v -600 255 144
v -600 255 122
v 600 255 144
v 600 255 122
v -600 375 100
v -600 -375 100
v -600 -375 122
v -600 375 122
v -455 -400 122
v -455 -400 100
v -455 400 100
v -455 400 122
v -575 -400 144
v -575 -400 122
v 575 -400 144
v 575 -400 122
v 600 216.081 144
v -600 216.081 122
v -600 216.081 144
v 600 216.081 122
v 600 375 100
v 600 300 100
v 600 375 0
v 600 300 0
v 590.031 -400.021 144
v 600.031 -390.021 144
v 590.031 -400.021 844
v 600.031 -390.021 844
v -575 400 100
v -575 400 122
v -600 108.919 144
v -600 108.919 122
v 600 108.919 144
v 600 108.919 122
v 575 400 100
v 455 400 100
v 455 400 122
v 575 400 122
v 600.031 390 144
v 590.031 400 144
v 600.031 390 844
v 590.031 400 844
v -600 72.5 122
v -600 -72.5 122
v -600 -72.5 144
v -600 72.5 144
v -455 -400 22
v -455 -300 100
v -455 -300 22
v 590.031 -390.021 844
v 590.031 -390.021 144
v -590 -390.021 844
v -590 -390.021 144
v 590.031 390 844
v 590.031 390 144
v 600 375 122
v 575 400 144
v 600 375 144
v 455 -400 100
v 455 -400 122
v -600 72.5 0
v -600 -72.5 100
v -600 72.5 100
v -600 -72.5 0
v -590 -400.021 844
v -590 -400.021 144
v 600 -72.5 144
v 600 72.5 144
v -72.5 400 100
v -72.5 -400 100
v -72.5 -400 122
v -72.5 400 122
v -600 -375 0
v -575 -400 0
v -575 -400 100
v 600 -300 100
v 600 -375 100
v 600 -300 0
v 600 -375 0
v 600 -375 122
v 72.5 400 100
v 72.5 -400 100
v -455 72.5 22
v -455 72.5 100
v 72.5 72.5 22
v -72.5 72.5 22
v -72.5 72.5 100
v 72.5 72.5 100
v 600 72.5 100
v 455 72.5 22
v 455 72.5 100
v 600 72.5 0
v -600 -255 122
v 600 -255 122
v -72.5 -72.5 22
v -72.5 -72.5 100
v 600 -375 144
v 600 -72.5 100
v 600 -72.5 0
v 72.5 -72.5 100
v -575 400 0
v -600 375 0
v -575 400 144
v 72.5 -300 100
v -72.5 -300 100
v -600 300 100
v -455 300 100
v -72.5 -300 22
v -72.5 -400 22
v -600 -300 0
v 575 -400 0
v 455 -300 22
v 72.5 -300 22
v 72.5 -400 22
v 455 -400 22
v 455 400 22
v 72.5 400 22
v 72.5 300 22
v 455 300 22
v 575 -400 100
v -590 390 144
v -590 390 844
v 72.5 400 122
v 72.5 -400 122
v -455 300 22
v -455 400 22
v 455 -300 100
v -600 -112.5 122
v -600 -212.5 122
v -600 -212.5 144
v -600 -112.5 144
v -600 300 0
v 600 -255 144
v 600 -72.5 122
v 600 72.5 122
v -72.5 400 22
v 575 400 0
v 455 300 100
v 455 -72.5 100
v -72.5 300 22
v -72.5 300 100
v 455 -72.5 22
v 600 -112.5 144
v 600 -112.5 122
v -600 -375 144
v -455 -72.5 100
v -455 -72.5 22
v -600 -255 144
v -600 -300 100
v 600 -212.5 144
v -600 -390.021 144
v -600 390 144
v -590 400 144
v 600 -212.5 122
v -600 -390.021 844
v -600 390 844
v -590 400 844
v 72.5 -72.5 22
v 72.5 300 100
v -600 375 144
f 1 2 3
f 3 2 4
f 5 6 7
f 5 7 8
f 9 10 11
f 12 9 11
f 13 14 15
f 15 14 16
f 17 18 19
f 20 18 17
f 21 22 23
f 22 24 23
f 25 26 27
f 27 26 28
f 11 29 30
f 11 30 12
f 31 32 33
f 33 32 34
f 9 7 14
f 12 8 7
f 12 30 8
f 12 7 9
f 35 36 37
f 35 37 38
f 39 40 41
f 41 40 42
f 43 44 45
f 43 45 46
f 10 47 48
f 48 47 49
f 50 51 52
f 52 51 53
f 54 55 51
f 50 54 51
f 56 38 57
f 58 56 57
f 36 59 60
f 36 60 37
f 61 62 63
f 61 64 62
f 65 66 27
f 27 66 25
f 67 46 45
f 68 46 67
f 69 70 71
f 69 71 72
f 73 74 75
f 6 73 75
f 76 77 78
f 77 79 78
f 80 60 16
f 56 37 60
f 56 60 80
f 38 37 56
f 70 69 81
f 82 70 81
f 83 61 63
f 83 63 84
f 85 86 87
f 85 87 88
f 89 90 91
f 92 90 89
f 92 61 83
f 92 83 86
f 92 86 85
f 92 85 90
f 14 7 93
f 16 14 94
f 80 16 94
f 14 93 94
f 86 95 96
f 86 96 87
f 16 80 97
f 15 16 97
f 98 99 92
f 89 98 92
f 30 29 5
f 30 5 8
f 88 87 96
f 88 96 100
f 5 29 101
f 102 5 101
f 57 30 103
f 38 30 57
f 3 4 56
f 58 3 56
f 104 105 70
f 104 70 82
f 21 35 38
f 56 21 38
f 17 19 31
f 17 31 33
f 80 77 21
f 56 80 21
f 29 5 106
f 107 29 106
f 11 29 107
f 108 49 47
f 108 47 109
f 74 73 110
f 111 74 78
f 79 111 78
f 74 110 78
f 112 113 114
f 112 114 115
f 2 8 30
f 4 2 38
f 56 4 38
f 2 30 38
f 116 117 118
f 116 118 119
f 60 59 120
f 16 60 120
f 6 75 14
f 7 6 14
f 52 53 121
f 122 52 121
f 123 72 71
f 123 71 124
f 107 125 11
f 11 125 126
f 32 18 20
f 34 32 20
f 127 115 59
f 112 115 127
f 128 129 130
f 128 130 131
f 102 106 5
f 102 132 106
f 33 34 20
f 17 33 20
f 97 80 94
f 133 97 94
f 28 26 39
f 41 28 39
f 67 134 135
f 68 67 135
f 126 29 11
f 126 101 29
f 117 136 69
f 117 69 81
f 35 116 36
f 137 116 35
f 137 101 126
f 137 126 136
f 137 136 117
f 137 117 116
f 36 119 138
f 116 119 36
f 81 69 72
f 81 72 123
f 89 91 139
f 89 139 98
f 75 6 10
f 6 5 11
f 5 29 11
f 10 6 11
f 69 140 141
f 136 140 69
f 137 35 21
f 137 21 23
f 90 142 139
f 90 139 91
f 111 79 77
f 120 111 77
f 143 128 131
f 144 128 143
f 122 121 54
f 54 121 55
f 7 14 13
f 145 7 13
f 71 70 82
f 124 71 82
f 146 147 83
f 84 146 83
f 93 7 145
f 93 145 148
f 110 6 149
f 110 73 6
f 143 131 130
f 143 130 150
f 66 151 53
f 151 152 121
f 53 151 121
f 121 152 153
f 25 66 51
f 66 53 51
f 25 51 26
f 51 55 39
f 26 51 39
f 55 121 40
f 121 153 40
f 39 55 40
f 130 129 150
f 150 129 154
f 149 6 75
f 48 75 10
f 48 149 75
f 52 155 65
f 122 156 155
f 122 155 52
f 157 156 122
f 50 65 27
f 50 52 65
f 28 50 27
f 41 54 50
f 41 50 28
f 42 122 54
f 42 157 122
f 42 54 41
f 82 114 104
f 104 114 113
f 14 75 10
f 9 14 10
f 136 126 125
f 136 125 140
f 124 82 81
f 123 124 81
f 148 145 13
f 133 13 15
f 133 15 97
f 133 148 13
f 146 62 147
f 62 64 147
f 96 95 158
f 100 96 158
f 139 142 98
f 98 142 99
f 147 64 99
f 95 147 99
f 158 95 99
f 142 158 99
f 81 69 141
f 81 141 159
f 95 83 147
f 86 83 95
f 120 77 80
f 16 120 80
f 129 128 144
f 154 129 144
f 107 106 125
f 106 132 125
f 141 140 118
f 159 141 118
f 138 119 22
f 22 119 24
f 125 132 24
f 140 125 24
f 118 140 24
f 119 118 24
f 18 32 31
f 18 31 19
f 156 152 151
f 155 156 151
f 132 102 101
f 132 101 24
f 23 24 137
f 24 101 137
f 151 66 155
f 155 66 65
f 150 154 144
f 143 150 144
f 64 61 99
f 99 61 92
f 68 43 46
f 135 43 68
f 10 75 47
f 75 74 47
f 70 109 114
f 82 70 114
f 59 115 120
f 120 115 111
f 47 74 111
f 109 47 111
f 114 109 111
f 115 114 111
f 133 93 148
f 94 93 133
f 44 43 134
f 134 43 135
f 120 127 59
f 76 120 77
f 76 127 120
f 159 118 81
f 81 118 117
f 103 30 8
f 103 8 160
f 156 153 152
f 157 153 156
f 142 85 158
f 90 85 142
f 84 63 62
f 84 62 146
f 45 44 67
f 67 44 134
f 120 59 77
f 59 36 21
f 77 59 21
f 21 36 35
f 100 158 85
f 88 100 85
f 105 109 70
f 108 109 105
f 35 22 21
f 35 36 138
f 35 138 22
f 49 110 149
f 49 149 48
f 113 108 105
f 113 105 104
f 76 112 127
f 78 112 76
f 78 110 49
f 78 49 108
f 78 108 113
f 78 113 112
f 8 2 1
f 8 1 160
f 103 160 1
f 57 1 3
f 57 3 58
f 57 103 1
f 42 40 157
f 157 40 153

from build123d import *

# Parameters (mm, degrees)
F0_W       = 1200
F0_H       = 100
F1_DEPTH   = 22
F0_H_2     = 72.5
F2_W       = 145
F2_H       = 100
F2_W_2     = 72.5
F3_DEPTH   = 78
F4_W       = 145
F4_H       = 145
F5_DEPTH   = 78
F6_W       = 145
F6_H       = 100
F7_DEPTH   = 78
F8_W       = 145
F8_H       = 800
F9_DEPTH   = 22
F10_W      = 145
F10_H      = 800
F11_DEPTH  = 22
F12_W      = 145
F12_H      = 800
F13_DEPTH  = 22
F14_W      = 1200
F14_H      = 145
F15_DEPTH  = 22
F16_W      = 1200
F16_H      = 145
F17_DEPTH  = 22
F18_W      = 1200
F18_H      = 145
F19_DEPTH  = 22
F20_W      = 1200
F20_H      = 107.1627608397
F21_DEPTH  = 22
F22_W      = 1200
F22_H      = 100
F23_DEPTH  = 22
F24_SIZE   = 25
F24_2_SIZE = 25
F24_3_SIZE = 25
F24_4_SIZE = 25
F24_5_SIZE = 25
F24_6_SIZE = 25
F26_DEPTH  = 700
F27_SIZE   = 10


with BuildPart() as f1:
    # F0 (on Top) → F1 (new body)
    with BuildSketch(Plane.XY):
        with Locations((0, 350)):
            Rectangle(F0_W, F0_H)
    extrude(amount=F1_DEPTH)

    # F2 (on face) → F3 (join)
    with BuildSketch(Plane.XY.offset(22)):
        with Locations((-527.5, 350)):
            Rectangle(F2_W, F2_H)
        with Locations((-36.25, 350)):
            Rectangle(F2_W_2, F2_H)
        with Locations((36.25, 350)):
            Rectangle(F2_W_2, F2_H)
        with Locations((527.5, 350)):
            Rectangle(F2_W, F2_H)
    extrude(amount=F3_DEPTH)

    # F24#6
    f24_6_edges = [f1.edges().sort_by_distance(p)[0] for p in [
        (600, 400, 50),
        (-600, 400, 50),
    ]]
    chamfer(f24_6_edges, length=F24_6_SIZE)


with BuildPart() as f1b:
    # F0 (on Top) → F1, piece 2 (new body)
    with BuildSketch(Plane.XY):
        with Locations((0, 36.25)):
            Rectangle(F0_W, F0_H_2)
        with Locations((0, -36.25)):
            Rectangle(F0_W, F0_H_2)
    extrude(amount=F1_DEPTH)

    # F4 (on face) → F5 (join)
    with BuildSketch(Plane.XY.offset(22)):
        with Locations((-527.5, 0)):
            Rectangle(F4_W, F4_H)
        Rectangle(F4_W, F4_H)
        with Locations((527.5, 0)):
            Rectangle(F4_W, F4_H)
    extrude(amount=F5_DEPTH)


with BuildPart() as f1c:
    # F0 (on Top) → F1, piece 3 (new body)
    with BuildSketch(Plane.XY):
        with Locations((0, -350)):
            Rectangle(F0_W, F0_H)
    extrude(amount=F1_DEPTH)

    # F6 (on face) → F7 (join)
    with BuildSketch(Plane.XY.offset(22)):
        with Locations((-527.5, -350)):
            Rectangle(F6_W, F6_H)
        with Locations((0, -350)):
            Rectangle(F6_W, F6_H)
        with Locations((527.5, -350)):
            Rectangle(F6_W, F6_H)
    extrude(amount=F7_DEPTH)

    # F24#3
    f24_3_edges = [f1c.edges().sort_by_distance(p)[0] for p in [
        (-600, -400, 50),
        (600, -400, 50),
    ]]
    chamfer(f24_3_edges, length=F24_3_SIZE)


with BuildPart() as f9:
    # F8 (on face) → F9 (new body)
    with BuildSketch(Plane.XY.offset(100)):
        with Locations((-527.5, 0)):
            Rectangle(F8_W, F8_H)
    extrude(amount=F9_DEPTH)

    # F24#2
    f24_2_edges = [f9.edges().sort_by_distance(p)[0] for p in [
        (-600, -400, 111),
        (-600, 400, 111),
    ]]
    chamfer(f24_2_edges, length=F24_2_SIZE)


with BuildPart() as f11:
    # F10 (on face) → F11 (new body)
    with BuildSketch(Plane.XY.offset(100)):
        Rectangle(F10_W, F10_H)
    extrude(amount=F11_DEPTH)


with BuildPart() as f13:
    # F12 (on face) → F13 (new body)
    with BuildSketch(Plane.XY.offset(100)):
        with Locations((527.5, 0)):
            Rectangle(F12_W, F12_H)
    extrude(amount=F13_DEPTH)

    # F24#4
    f24_4_edges = [f13.edges().sort_by_distance(p)[0] for p in [
        (600, -400, 111),
        (600, 400, 111),
    ]]
    chamfer(f24_4_edges, length=F24_4_SIZE)


with BuildPart() as f15:
    # F14 (on face) → F15 (new body)
    with BuildSketch(Plane.XY.offset(122)):
        with Locations((0, 327.5)):
            Rectangle(F14_W, F14_H)
    extrude(amount=F15_DEPTH)

    # F24#5
    f24_5_edges = [f15.edges().sort_by_distance(p)[0] for p in [
        (600, 400, 133),
        (-600, 400, 133),
    ]]
    chamfer(f24_5_edges, length=F24_5_SIZE)


with BuildPart() as f17:
    # F16 (on face) → F17 (new body)
    with BuildSketch(Plane.XY.offset(122)):
        Rectangle(F16_W, F16_H)
    extrude(amount=F17_DEPTH)


with BuildPart() as f19:
    # F18 (on face) → F19 (new body)
    with BuildSketch(Plane.XY.offset(122)):
        with Locations((0, -327.5)):
            Rectangle(F18_W, F18_H)
    extrude(amount=F19_DEPTH)

    # F24
    f24_edges = [f19.edges().sort_by_distance(p)[0] for p in [
        (-600, -400, 133),
        (600, -400, 133),
    ]]
    chamfer(f24_edges, length=F24_SIZE)


with BuildPart() as f21:
    # F20 (on face) → F21 (new body)
    with BuildSketch(Plane.XY.offset(122)):
        with Locations((0, 162.5)):
            Rectangle(F20_W, F20_H)
    extrude(amount=F21_DEPTH)


with BuildPart() as f23:
    # F22 (on face) → F23 (new body)
    with BuildSketch(Plane.XY.offset(122)):
        with Locations((0, -162.5)):
            Rectangle(F22_W, F22_H)
    extrude(amount=F23_DEPTH)


with BuildPart() as f26:
    # F25 (on face) → F26 (new body)
    with BuildSketch(Plane.XY.offset(144)):
        Polygon((575, 400), (-575, 400), (-585, 390), (585, 390), align=None)
        Polygon((-575, 400), (-600, 400), (-600, 375), (-590, 385), (-590, 390), (-585, 390), align=None)
        Polygon((-590, 385), (-600, 375), (-600, 255), (-590, 255), align=None)
        Polygon((600.0311231613, 400), (575, 400), (585, 390), (590.0311231613, 390), (590.0311231613, 384.9688768387), (600, 375), (600, 255), (590.0311231613, 255), (590.0311231613, -390.0209569931), (-590, -390.0209569931), (-590, 255), (-600, 255), (-600, -400.0209569931), (600.0311231613, -400.0209569931), align=None)
        Polygon((600, 375), (590.0311231613, 384.9688768387), (590.0311231613, 255), (600, 255), align=None)
    extrude(amount=F26_DEPTH)

    # F27
    f27_edges = [f26.edges().sort_by_distance(p)[0] for p in [
        (600.031123, -400.020957, 494),
        (-600, -400.020957, 494),
        (-600, 400, 494),
        (600.031123, 400, 494),
    ]]
    chamfer(f27_edges, length=F27_SIZE)


solid = Compound([f1.part, f1b.part, f1c.part, f9.part, f11.part, f13.part, f15.part, f17.part, f19.part, f21.part, f23.part, f26.part])
